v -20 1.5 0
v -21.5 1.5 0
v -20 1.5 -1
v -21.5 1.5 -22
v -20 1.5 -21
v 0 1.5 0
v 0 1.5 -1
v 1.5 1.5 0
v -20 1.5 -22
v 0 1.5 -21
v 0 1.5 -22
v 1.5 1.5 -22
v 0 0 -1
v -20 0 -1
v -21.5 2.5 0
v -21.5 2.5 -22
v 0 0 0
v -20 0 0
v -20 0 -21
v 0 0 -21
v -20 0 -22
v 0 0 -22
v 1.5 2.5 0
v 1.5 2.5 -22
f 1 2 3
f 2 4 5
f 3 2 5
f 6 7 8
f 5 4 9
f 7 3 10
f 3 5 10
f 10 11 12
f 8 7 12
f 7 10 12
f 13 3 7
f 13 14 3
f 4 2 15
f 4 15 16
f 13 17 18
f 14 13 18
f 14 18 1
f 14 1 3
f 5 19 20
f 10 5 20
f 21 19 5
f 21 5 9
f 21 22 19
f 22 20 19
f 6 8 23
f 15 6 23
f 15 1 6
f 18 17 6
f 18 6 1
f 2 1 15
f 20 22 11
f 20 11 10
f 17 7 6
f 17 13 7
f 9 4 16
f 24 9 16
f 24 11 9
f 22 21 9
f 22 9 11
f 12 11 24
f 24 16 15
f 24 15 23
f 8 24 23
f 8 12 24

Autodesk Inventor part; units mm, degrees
ref_plane "YZ Plane" through (0, 0, 0) normal (1, 0, 0) x (0, 1, 0)
ref_plane "XZ Plane" through (0, 0, 0) normal (0, 1, 0) x (-1, 0, 0)
ref_plane "XY Plane" through (0, 0, 0) normal (0, 0, 1) x (1, 0, 0)
sketch "Skizze1" plane through (0, 0, 0) normal (0, 1, 0) x (-1, 0, 0)
  point P0 (0, 0)
sketch "Skizze2" plane through (0, 0, 0) normal (0, 1, 0) x (-1, 0, 0)
  line L0 (0, 0) -> (20, 0)
  line L1 (20, 0) -> (20, -22)
  line L2 (20, -22) -> (0, -22)
  line L3 (0, -22) -> (0, 0)
  line L4 (0, 0) -> (20, 0)
  line L5 (20, 0) -> (20, -1)
  line L6 (20, -1) -> (0, -1)
  line L7 (0, -1) -> (0, 0)
  line L8 (0, -22) -> (20, -22)
  line L9 (20, -22) -> (20, -21)
  line L10 (20, -21) -> (0, -21)
  line L11 (0, -21) -> (0, -22)
  dimension "d0" = 20
  dimension "d1" = 22
  dimension "d2" = 20
  dimension "d3" = 1
  dimension "d4" = 20
  dimension "d5" = 1
extrude "Extrusion1" add sketch "Skizze2" along normal blind 1.5 contours L0 L1 L6 L3 | L10 L1 L2 L3
sketch "Skizze3" plane through (0, 1.5, 0) normal (0, 1, 0) x (1, 0, 0)
  line L0 (1.5, 0) -> (-21.5, 0)
  line L1 (-21.5, 0) -> (-21.5, 22)
  line L2 (-21.5, 22) -> (1.5, 22)
  line L3 (1.5, 22) -> (1.5, 0)
  line L4 (-20, 22) -> (-20, 21) projected
  point P0 (0, 0)
  point P1 (-20, 21.5)
  dimension "d8" = 23
  dimension "d9" = 22
  dimension "d10" = 1.5
extrude "Extrusion2" add sketch "Skizze3" along normal blind 1
equation "\"Biegeradius\" = Stärke"
equation "\"BreiteBiegungsfreistellung\" = Stärke"
equation "\"TiefeBiegungsfreistellung\" = 0.5 * Stärke"
equation "\"GrößeEckenfreistellung\" = 4 * Stärke"
equation "\"MinimalRest\" = 2 * Stärke"
equation "\"Übergangsradius\" = Biegeradius"
equation "\"JacobiRadiusGröße\" = Biegeradius"
equation "\"Abstandsgröße\" = Stärke"
equation "\"Stärke\" = 0.5"
properties part number "V3_O3"
